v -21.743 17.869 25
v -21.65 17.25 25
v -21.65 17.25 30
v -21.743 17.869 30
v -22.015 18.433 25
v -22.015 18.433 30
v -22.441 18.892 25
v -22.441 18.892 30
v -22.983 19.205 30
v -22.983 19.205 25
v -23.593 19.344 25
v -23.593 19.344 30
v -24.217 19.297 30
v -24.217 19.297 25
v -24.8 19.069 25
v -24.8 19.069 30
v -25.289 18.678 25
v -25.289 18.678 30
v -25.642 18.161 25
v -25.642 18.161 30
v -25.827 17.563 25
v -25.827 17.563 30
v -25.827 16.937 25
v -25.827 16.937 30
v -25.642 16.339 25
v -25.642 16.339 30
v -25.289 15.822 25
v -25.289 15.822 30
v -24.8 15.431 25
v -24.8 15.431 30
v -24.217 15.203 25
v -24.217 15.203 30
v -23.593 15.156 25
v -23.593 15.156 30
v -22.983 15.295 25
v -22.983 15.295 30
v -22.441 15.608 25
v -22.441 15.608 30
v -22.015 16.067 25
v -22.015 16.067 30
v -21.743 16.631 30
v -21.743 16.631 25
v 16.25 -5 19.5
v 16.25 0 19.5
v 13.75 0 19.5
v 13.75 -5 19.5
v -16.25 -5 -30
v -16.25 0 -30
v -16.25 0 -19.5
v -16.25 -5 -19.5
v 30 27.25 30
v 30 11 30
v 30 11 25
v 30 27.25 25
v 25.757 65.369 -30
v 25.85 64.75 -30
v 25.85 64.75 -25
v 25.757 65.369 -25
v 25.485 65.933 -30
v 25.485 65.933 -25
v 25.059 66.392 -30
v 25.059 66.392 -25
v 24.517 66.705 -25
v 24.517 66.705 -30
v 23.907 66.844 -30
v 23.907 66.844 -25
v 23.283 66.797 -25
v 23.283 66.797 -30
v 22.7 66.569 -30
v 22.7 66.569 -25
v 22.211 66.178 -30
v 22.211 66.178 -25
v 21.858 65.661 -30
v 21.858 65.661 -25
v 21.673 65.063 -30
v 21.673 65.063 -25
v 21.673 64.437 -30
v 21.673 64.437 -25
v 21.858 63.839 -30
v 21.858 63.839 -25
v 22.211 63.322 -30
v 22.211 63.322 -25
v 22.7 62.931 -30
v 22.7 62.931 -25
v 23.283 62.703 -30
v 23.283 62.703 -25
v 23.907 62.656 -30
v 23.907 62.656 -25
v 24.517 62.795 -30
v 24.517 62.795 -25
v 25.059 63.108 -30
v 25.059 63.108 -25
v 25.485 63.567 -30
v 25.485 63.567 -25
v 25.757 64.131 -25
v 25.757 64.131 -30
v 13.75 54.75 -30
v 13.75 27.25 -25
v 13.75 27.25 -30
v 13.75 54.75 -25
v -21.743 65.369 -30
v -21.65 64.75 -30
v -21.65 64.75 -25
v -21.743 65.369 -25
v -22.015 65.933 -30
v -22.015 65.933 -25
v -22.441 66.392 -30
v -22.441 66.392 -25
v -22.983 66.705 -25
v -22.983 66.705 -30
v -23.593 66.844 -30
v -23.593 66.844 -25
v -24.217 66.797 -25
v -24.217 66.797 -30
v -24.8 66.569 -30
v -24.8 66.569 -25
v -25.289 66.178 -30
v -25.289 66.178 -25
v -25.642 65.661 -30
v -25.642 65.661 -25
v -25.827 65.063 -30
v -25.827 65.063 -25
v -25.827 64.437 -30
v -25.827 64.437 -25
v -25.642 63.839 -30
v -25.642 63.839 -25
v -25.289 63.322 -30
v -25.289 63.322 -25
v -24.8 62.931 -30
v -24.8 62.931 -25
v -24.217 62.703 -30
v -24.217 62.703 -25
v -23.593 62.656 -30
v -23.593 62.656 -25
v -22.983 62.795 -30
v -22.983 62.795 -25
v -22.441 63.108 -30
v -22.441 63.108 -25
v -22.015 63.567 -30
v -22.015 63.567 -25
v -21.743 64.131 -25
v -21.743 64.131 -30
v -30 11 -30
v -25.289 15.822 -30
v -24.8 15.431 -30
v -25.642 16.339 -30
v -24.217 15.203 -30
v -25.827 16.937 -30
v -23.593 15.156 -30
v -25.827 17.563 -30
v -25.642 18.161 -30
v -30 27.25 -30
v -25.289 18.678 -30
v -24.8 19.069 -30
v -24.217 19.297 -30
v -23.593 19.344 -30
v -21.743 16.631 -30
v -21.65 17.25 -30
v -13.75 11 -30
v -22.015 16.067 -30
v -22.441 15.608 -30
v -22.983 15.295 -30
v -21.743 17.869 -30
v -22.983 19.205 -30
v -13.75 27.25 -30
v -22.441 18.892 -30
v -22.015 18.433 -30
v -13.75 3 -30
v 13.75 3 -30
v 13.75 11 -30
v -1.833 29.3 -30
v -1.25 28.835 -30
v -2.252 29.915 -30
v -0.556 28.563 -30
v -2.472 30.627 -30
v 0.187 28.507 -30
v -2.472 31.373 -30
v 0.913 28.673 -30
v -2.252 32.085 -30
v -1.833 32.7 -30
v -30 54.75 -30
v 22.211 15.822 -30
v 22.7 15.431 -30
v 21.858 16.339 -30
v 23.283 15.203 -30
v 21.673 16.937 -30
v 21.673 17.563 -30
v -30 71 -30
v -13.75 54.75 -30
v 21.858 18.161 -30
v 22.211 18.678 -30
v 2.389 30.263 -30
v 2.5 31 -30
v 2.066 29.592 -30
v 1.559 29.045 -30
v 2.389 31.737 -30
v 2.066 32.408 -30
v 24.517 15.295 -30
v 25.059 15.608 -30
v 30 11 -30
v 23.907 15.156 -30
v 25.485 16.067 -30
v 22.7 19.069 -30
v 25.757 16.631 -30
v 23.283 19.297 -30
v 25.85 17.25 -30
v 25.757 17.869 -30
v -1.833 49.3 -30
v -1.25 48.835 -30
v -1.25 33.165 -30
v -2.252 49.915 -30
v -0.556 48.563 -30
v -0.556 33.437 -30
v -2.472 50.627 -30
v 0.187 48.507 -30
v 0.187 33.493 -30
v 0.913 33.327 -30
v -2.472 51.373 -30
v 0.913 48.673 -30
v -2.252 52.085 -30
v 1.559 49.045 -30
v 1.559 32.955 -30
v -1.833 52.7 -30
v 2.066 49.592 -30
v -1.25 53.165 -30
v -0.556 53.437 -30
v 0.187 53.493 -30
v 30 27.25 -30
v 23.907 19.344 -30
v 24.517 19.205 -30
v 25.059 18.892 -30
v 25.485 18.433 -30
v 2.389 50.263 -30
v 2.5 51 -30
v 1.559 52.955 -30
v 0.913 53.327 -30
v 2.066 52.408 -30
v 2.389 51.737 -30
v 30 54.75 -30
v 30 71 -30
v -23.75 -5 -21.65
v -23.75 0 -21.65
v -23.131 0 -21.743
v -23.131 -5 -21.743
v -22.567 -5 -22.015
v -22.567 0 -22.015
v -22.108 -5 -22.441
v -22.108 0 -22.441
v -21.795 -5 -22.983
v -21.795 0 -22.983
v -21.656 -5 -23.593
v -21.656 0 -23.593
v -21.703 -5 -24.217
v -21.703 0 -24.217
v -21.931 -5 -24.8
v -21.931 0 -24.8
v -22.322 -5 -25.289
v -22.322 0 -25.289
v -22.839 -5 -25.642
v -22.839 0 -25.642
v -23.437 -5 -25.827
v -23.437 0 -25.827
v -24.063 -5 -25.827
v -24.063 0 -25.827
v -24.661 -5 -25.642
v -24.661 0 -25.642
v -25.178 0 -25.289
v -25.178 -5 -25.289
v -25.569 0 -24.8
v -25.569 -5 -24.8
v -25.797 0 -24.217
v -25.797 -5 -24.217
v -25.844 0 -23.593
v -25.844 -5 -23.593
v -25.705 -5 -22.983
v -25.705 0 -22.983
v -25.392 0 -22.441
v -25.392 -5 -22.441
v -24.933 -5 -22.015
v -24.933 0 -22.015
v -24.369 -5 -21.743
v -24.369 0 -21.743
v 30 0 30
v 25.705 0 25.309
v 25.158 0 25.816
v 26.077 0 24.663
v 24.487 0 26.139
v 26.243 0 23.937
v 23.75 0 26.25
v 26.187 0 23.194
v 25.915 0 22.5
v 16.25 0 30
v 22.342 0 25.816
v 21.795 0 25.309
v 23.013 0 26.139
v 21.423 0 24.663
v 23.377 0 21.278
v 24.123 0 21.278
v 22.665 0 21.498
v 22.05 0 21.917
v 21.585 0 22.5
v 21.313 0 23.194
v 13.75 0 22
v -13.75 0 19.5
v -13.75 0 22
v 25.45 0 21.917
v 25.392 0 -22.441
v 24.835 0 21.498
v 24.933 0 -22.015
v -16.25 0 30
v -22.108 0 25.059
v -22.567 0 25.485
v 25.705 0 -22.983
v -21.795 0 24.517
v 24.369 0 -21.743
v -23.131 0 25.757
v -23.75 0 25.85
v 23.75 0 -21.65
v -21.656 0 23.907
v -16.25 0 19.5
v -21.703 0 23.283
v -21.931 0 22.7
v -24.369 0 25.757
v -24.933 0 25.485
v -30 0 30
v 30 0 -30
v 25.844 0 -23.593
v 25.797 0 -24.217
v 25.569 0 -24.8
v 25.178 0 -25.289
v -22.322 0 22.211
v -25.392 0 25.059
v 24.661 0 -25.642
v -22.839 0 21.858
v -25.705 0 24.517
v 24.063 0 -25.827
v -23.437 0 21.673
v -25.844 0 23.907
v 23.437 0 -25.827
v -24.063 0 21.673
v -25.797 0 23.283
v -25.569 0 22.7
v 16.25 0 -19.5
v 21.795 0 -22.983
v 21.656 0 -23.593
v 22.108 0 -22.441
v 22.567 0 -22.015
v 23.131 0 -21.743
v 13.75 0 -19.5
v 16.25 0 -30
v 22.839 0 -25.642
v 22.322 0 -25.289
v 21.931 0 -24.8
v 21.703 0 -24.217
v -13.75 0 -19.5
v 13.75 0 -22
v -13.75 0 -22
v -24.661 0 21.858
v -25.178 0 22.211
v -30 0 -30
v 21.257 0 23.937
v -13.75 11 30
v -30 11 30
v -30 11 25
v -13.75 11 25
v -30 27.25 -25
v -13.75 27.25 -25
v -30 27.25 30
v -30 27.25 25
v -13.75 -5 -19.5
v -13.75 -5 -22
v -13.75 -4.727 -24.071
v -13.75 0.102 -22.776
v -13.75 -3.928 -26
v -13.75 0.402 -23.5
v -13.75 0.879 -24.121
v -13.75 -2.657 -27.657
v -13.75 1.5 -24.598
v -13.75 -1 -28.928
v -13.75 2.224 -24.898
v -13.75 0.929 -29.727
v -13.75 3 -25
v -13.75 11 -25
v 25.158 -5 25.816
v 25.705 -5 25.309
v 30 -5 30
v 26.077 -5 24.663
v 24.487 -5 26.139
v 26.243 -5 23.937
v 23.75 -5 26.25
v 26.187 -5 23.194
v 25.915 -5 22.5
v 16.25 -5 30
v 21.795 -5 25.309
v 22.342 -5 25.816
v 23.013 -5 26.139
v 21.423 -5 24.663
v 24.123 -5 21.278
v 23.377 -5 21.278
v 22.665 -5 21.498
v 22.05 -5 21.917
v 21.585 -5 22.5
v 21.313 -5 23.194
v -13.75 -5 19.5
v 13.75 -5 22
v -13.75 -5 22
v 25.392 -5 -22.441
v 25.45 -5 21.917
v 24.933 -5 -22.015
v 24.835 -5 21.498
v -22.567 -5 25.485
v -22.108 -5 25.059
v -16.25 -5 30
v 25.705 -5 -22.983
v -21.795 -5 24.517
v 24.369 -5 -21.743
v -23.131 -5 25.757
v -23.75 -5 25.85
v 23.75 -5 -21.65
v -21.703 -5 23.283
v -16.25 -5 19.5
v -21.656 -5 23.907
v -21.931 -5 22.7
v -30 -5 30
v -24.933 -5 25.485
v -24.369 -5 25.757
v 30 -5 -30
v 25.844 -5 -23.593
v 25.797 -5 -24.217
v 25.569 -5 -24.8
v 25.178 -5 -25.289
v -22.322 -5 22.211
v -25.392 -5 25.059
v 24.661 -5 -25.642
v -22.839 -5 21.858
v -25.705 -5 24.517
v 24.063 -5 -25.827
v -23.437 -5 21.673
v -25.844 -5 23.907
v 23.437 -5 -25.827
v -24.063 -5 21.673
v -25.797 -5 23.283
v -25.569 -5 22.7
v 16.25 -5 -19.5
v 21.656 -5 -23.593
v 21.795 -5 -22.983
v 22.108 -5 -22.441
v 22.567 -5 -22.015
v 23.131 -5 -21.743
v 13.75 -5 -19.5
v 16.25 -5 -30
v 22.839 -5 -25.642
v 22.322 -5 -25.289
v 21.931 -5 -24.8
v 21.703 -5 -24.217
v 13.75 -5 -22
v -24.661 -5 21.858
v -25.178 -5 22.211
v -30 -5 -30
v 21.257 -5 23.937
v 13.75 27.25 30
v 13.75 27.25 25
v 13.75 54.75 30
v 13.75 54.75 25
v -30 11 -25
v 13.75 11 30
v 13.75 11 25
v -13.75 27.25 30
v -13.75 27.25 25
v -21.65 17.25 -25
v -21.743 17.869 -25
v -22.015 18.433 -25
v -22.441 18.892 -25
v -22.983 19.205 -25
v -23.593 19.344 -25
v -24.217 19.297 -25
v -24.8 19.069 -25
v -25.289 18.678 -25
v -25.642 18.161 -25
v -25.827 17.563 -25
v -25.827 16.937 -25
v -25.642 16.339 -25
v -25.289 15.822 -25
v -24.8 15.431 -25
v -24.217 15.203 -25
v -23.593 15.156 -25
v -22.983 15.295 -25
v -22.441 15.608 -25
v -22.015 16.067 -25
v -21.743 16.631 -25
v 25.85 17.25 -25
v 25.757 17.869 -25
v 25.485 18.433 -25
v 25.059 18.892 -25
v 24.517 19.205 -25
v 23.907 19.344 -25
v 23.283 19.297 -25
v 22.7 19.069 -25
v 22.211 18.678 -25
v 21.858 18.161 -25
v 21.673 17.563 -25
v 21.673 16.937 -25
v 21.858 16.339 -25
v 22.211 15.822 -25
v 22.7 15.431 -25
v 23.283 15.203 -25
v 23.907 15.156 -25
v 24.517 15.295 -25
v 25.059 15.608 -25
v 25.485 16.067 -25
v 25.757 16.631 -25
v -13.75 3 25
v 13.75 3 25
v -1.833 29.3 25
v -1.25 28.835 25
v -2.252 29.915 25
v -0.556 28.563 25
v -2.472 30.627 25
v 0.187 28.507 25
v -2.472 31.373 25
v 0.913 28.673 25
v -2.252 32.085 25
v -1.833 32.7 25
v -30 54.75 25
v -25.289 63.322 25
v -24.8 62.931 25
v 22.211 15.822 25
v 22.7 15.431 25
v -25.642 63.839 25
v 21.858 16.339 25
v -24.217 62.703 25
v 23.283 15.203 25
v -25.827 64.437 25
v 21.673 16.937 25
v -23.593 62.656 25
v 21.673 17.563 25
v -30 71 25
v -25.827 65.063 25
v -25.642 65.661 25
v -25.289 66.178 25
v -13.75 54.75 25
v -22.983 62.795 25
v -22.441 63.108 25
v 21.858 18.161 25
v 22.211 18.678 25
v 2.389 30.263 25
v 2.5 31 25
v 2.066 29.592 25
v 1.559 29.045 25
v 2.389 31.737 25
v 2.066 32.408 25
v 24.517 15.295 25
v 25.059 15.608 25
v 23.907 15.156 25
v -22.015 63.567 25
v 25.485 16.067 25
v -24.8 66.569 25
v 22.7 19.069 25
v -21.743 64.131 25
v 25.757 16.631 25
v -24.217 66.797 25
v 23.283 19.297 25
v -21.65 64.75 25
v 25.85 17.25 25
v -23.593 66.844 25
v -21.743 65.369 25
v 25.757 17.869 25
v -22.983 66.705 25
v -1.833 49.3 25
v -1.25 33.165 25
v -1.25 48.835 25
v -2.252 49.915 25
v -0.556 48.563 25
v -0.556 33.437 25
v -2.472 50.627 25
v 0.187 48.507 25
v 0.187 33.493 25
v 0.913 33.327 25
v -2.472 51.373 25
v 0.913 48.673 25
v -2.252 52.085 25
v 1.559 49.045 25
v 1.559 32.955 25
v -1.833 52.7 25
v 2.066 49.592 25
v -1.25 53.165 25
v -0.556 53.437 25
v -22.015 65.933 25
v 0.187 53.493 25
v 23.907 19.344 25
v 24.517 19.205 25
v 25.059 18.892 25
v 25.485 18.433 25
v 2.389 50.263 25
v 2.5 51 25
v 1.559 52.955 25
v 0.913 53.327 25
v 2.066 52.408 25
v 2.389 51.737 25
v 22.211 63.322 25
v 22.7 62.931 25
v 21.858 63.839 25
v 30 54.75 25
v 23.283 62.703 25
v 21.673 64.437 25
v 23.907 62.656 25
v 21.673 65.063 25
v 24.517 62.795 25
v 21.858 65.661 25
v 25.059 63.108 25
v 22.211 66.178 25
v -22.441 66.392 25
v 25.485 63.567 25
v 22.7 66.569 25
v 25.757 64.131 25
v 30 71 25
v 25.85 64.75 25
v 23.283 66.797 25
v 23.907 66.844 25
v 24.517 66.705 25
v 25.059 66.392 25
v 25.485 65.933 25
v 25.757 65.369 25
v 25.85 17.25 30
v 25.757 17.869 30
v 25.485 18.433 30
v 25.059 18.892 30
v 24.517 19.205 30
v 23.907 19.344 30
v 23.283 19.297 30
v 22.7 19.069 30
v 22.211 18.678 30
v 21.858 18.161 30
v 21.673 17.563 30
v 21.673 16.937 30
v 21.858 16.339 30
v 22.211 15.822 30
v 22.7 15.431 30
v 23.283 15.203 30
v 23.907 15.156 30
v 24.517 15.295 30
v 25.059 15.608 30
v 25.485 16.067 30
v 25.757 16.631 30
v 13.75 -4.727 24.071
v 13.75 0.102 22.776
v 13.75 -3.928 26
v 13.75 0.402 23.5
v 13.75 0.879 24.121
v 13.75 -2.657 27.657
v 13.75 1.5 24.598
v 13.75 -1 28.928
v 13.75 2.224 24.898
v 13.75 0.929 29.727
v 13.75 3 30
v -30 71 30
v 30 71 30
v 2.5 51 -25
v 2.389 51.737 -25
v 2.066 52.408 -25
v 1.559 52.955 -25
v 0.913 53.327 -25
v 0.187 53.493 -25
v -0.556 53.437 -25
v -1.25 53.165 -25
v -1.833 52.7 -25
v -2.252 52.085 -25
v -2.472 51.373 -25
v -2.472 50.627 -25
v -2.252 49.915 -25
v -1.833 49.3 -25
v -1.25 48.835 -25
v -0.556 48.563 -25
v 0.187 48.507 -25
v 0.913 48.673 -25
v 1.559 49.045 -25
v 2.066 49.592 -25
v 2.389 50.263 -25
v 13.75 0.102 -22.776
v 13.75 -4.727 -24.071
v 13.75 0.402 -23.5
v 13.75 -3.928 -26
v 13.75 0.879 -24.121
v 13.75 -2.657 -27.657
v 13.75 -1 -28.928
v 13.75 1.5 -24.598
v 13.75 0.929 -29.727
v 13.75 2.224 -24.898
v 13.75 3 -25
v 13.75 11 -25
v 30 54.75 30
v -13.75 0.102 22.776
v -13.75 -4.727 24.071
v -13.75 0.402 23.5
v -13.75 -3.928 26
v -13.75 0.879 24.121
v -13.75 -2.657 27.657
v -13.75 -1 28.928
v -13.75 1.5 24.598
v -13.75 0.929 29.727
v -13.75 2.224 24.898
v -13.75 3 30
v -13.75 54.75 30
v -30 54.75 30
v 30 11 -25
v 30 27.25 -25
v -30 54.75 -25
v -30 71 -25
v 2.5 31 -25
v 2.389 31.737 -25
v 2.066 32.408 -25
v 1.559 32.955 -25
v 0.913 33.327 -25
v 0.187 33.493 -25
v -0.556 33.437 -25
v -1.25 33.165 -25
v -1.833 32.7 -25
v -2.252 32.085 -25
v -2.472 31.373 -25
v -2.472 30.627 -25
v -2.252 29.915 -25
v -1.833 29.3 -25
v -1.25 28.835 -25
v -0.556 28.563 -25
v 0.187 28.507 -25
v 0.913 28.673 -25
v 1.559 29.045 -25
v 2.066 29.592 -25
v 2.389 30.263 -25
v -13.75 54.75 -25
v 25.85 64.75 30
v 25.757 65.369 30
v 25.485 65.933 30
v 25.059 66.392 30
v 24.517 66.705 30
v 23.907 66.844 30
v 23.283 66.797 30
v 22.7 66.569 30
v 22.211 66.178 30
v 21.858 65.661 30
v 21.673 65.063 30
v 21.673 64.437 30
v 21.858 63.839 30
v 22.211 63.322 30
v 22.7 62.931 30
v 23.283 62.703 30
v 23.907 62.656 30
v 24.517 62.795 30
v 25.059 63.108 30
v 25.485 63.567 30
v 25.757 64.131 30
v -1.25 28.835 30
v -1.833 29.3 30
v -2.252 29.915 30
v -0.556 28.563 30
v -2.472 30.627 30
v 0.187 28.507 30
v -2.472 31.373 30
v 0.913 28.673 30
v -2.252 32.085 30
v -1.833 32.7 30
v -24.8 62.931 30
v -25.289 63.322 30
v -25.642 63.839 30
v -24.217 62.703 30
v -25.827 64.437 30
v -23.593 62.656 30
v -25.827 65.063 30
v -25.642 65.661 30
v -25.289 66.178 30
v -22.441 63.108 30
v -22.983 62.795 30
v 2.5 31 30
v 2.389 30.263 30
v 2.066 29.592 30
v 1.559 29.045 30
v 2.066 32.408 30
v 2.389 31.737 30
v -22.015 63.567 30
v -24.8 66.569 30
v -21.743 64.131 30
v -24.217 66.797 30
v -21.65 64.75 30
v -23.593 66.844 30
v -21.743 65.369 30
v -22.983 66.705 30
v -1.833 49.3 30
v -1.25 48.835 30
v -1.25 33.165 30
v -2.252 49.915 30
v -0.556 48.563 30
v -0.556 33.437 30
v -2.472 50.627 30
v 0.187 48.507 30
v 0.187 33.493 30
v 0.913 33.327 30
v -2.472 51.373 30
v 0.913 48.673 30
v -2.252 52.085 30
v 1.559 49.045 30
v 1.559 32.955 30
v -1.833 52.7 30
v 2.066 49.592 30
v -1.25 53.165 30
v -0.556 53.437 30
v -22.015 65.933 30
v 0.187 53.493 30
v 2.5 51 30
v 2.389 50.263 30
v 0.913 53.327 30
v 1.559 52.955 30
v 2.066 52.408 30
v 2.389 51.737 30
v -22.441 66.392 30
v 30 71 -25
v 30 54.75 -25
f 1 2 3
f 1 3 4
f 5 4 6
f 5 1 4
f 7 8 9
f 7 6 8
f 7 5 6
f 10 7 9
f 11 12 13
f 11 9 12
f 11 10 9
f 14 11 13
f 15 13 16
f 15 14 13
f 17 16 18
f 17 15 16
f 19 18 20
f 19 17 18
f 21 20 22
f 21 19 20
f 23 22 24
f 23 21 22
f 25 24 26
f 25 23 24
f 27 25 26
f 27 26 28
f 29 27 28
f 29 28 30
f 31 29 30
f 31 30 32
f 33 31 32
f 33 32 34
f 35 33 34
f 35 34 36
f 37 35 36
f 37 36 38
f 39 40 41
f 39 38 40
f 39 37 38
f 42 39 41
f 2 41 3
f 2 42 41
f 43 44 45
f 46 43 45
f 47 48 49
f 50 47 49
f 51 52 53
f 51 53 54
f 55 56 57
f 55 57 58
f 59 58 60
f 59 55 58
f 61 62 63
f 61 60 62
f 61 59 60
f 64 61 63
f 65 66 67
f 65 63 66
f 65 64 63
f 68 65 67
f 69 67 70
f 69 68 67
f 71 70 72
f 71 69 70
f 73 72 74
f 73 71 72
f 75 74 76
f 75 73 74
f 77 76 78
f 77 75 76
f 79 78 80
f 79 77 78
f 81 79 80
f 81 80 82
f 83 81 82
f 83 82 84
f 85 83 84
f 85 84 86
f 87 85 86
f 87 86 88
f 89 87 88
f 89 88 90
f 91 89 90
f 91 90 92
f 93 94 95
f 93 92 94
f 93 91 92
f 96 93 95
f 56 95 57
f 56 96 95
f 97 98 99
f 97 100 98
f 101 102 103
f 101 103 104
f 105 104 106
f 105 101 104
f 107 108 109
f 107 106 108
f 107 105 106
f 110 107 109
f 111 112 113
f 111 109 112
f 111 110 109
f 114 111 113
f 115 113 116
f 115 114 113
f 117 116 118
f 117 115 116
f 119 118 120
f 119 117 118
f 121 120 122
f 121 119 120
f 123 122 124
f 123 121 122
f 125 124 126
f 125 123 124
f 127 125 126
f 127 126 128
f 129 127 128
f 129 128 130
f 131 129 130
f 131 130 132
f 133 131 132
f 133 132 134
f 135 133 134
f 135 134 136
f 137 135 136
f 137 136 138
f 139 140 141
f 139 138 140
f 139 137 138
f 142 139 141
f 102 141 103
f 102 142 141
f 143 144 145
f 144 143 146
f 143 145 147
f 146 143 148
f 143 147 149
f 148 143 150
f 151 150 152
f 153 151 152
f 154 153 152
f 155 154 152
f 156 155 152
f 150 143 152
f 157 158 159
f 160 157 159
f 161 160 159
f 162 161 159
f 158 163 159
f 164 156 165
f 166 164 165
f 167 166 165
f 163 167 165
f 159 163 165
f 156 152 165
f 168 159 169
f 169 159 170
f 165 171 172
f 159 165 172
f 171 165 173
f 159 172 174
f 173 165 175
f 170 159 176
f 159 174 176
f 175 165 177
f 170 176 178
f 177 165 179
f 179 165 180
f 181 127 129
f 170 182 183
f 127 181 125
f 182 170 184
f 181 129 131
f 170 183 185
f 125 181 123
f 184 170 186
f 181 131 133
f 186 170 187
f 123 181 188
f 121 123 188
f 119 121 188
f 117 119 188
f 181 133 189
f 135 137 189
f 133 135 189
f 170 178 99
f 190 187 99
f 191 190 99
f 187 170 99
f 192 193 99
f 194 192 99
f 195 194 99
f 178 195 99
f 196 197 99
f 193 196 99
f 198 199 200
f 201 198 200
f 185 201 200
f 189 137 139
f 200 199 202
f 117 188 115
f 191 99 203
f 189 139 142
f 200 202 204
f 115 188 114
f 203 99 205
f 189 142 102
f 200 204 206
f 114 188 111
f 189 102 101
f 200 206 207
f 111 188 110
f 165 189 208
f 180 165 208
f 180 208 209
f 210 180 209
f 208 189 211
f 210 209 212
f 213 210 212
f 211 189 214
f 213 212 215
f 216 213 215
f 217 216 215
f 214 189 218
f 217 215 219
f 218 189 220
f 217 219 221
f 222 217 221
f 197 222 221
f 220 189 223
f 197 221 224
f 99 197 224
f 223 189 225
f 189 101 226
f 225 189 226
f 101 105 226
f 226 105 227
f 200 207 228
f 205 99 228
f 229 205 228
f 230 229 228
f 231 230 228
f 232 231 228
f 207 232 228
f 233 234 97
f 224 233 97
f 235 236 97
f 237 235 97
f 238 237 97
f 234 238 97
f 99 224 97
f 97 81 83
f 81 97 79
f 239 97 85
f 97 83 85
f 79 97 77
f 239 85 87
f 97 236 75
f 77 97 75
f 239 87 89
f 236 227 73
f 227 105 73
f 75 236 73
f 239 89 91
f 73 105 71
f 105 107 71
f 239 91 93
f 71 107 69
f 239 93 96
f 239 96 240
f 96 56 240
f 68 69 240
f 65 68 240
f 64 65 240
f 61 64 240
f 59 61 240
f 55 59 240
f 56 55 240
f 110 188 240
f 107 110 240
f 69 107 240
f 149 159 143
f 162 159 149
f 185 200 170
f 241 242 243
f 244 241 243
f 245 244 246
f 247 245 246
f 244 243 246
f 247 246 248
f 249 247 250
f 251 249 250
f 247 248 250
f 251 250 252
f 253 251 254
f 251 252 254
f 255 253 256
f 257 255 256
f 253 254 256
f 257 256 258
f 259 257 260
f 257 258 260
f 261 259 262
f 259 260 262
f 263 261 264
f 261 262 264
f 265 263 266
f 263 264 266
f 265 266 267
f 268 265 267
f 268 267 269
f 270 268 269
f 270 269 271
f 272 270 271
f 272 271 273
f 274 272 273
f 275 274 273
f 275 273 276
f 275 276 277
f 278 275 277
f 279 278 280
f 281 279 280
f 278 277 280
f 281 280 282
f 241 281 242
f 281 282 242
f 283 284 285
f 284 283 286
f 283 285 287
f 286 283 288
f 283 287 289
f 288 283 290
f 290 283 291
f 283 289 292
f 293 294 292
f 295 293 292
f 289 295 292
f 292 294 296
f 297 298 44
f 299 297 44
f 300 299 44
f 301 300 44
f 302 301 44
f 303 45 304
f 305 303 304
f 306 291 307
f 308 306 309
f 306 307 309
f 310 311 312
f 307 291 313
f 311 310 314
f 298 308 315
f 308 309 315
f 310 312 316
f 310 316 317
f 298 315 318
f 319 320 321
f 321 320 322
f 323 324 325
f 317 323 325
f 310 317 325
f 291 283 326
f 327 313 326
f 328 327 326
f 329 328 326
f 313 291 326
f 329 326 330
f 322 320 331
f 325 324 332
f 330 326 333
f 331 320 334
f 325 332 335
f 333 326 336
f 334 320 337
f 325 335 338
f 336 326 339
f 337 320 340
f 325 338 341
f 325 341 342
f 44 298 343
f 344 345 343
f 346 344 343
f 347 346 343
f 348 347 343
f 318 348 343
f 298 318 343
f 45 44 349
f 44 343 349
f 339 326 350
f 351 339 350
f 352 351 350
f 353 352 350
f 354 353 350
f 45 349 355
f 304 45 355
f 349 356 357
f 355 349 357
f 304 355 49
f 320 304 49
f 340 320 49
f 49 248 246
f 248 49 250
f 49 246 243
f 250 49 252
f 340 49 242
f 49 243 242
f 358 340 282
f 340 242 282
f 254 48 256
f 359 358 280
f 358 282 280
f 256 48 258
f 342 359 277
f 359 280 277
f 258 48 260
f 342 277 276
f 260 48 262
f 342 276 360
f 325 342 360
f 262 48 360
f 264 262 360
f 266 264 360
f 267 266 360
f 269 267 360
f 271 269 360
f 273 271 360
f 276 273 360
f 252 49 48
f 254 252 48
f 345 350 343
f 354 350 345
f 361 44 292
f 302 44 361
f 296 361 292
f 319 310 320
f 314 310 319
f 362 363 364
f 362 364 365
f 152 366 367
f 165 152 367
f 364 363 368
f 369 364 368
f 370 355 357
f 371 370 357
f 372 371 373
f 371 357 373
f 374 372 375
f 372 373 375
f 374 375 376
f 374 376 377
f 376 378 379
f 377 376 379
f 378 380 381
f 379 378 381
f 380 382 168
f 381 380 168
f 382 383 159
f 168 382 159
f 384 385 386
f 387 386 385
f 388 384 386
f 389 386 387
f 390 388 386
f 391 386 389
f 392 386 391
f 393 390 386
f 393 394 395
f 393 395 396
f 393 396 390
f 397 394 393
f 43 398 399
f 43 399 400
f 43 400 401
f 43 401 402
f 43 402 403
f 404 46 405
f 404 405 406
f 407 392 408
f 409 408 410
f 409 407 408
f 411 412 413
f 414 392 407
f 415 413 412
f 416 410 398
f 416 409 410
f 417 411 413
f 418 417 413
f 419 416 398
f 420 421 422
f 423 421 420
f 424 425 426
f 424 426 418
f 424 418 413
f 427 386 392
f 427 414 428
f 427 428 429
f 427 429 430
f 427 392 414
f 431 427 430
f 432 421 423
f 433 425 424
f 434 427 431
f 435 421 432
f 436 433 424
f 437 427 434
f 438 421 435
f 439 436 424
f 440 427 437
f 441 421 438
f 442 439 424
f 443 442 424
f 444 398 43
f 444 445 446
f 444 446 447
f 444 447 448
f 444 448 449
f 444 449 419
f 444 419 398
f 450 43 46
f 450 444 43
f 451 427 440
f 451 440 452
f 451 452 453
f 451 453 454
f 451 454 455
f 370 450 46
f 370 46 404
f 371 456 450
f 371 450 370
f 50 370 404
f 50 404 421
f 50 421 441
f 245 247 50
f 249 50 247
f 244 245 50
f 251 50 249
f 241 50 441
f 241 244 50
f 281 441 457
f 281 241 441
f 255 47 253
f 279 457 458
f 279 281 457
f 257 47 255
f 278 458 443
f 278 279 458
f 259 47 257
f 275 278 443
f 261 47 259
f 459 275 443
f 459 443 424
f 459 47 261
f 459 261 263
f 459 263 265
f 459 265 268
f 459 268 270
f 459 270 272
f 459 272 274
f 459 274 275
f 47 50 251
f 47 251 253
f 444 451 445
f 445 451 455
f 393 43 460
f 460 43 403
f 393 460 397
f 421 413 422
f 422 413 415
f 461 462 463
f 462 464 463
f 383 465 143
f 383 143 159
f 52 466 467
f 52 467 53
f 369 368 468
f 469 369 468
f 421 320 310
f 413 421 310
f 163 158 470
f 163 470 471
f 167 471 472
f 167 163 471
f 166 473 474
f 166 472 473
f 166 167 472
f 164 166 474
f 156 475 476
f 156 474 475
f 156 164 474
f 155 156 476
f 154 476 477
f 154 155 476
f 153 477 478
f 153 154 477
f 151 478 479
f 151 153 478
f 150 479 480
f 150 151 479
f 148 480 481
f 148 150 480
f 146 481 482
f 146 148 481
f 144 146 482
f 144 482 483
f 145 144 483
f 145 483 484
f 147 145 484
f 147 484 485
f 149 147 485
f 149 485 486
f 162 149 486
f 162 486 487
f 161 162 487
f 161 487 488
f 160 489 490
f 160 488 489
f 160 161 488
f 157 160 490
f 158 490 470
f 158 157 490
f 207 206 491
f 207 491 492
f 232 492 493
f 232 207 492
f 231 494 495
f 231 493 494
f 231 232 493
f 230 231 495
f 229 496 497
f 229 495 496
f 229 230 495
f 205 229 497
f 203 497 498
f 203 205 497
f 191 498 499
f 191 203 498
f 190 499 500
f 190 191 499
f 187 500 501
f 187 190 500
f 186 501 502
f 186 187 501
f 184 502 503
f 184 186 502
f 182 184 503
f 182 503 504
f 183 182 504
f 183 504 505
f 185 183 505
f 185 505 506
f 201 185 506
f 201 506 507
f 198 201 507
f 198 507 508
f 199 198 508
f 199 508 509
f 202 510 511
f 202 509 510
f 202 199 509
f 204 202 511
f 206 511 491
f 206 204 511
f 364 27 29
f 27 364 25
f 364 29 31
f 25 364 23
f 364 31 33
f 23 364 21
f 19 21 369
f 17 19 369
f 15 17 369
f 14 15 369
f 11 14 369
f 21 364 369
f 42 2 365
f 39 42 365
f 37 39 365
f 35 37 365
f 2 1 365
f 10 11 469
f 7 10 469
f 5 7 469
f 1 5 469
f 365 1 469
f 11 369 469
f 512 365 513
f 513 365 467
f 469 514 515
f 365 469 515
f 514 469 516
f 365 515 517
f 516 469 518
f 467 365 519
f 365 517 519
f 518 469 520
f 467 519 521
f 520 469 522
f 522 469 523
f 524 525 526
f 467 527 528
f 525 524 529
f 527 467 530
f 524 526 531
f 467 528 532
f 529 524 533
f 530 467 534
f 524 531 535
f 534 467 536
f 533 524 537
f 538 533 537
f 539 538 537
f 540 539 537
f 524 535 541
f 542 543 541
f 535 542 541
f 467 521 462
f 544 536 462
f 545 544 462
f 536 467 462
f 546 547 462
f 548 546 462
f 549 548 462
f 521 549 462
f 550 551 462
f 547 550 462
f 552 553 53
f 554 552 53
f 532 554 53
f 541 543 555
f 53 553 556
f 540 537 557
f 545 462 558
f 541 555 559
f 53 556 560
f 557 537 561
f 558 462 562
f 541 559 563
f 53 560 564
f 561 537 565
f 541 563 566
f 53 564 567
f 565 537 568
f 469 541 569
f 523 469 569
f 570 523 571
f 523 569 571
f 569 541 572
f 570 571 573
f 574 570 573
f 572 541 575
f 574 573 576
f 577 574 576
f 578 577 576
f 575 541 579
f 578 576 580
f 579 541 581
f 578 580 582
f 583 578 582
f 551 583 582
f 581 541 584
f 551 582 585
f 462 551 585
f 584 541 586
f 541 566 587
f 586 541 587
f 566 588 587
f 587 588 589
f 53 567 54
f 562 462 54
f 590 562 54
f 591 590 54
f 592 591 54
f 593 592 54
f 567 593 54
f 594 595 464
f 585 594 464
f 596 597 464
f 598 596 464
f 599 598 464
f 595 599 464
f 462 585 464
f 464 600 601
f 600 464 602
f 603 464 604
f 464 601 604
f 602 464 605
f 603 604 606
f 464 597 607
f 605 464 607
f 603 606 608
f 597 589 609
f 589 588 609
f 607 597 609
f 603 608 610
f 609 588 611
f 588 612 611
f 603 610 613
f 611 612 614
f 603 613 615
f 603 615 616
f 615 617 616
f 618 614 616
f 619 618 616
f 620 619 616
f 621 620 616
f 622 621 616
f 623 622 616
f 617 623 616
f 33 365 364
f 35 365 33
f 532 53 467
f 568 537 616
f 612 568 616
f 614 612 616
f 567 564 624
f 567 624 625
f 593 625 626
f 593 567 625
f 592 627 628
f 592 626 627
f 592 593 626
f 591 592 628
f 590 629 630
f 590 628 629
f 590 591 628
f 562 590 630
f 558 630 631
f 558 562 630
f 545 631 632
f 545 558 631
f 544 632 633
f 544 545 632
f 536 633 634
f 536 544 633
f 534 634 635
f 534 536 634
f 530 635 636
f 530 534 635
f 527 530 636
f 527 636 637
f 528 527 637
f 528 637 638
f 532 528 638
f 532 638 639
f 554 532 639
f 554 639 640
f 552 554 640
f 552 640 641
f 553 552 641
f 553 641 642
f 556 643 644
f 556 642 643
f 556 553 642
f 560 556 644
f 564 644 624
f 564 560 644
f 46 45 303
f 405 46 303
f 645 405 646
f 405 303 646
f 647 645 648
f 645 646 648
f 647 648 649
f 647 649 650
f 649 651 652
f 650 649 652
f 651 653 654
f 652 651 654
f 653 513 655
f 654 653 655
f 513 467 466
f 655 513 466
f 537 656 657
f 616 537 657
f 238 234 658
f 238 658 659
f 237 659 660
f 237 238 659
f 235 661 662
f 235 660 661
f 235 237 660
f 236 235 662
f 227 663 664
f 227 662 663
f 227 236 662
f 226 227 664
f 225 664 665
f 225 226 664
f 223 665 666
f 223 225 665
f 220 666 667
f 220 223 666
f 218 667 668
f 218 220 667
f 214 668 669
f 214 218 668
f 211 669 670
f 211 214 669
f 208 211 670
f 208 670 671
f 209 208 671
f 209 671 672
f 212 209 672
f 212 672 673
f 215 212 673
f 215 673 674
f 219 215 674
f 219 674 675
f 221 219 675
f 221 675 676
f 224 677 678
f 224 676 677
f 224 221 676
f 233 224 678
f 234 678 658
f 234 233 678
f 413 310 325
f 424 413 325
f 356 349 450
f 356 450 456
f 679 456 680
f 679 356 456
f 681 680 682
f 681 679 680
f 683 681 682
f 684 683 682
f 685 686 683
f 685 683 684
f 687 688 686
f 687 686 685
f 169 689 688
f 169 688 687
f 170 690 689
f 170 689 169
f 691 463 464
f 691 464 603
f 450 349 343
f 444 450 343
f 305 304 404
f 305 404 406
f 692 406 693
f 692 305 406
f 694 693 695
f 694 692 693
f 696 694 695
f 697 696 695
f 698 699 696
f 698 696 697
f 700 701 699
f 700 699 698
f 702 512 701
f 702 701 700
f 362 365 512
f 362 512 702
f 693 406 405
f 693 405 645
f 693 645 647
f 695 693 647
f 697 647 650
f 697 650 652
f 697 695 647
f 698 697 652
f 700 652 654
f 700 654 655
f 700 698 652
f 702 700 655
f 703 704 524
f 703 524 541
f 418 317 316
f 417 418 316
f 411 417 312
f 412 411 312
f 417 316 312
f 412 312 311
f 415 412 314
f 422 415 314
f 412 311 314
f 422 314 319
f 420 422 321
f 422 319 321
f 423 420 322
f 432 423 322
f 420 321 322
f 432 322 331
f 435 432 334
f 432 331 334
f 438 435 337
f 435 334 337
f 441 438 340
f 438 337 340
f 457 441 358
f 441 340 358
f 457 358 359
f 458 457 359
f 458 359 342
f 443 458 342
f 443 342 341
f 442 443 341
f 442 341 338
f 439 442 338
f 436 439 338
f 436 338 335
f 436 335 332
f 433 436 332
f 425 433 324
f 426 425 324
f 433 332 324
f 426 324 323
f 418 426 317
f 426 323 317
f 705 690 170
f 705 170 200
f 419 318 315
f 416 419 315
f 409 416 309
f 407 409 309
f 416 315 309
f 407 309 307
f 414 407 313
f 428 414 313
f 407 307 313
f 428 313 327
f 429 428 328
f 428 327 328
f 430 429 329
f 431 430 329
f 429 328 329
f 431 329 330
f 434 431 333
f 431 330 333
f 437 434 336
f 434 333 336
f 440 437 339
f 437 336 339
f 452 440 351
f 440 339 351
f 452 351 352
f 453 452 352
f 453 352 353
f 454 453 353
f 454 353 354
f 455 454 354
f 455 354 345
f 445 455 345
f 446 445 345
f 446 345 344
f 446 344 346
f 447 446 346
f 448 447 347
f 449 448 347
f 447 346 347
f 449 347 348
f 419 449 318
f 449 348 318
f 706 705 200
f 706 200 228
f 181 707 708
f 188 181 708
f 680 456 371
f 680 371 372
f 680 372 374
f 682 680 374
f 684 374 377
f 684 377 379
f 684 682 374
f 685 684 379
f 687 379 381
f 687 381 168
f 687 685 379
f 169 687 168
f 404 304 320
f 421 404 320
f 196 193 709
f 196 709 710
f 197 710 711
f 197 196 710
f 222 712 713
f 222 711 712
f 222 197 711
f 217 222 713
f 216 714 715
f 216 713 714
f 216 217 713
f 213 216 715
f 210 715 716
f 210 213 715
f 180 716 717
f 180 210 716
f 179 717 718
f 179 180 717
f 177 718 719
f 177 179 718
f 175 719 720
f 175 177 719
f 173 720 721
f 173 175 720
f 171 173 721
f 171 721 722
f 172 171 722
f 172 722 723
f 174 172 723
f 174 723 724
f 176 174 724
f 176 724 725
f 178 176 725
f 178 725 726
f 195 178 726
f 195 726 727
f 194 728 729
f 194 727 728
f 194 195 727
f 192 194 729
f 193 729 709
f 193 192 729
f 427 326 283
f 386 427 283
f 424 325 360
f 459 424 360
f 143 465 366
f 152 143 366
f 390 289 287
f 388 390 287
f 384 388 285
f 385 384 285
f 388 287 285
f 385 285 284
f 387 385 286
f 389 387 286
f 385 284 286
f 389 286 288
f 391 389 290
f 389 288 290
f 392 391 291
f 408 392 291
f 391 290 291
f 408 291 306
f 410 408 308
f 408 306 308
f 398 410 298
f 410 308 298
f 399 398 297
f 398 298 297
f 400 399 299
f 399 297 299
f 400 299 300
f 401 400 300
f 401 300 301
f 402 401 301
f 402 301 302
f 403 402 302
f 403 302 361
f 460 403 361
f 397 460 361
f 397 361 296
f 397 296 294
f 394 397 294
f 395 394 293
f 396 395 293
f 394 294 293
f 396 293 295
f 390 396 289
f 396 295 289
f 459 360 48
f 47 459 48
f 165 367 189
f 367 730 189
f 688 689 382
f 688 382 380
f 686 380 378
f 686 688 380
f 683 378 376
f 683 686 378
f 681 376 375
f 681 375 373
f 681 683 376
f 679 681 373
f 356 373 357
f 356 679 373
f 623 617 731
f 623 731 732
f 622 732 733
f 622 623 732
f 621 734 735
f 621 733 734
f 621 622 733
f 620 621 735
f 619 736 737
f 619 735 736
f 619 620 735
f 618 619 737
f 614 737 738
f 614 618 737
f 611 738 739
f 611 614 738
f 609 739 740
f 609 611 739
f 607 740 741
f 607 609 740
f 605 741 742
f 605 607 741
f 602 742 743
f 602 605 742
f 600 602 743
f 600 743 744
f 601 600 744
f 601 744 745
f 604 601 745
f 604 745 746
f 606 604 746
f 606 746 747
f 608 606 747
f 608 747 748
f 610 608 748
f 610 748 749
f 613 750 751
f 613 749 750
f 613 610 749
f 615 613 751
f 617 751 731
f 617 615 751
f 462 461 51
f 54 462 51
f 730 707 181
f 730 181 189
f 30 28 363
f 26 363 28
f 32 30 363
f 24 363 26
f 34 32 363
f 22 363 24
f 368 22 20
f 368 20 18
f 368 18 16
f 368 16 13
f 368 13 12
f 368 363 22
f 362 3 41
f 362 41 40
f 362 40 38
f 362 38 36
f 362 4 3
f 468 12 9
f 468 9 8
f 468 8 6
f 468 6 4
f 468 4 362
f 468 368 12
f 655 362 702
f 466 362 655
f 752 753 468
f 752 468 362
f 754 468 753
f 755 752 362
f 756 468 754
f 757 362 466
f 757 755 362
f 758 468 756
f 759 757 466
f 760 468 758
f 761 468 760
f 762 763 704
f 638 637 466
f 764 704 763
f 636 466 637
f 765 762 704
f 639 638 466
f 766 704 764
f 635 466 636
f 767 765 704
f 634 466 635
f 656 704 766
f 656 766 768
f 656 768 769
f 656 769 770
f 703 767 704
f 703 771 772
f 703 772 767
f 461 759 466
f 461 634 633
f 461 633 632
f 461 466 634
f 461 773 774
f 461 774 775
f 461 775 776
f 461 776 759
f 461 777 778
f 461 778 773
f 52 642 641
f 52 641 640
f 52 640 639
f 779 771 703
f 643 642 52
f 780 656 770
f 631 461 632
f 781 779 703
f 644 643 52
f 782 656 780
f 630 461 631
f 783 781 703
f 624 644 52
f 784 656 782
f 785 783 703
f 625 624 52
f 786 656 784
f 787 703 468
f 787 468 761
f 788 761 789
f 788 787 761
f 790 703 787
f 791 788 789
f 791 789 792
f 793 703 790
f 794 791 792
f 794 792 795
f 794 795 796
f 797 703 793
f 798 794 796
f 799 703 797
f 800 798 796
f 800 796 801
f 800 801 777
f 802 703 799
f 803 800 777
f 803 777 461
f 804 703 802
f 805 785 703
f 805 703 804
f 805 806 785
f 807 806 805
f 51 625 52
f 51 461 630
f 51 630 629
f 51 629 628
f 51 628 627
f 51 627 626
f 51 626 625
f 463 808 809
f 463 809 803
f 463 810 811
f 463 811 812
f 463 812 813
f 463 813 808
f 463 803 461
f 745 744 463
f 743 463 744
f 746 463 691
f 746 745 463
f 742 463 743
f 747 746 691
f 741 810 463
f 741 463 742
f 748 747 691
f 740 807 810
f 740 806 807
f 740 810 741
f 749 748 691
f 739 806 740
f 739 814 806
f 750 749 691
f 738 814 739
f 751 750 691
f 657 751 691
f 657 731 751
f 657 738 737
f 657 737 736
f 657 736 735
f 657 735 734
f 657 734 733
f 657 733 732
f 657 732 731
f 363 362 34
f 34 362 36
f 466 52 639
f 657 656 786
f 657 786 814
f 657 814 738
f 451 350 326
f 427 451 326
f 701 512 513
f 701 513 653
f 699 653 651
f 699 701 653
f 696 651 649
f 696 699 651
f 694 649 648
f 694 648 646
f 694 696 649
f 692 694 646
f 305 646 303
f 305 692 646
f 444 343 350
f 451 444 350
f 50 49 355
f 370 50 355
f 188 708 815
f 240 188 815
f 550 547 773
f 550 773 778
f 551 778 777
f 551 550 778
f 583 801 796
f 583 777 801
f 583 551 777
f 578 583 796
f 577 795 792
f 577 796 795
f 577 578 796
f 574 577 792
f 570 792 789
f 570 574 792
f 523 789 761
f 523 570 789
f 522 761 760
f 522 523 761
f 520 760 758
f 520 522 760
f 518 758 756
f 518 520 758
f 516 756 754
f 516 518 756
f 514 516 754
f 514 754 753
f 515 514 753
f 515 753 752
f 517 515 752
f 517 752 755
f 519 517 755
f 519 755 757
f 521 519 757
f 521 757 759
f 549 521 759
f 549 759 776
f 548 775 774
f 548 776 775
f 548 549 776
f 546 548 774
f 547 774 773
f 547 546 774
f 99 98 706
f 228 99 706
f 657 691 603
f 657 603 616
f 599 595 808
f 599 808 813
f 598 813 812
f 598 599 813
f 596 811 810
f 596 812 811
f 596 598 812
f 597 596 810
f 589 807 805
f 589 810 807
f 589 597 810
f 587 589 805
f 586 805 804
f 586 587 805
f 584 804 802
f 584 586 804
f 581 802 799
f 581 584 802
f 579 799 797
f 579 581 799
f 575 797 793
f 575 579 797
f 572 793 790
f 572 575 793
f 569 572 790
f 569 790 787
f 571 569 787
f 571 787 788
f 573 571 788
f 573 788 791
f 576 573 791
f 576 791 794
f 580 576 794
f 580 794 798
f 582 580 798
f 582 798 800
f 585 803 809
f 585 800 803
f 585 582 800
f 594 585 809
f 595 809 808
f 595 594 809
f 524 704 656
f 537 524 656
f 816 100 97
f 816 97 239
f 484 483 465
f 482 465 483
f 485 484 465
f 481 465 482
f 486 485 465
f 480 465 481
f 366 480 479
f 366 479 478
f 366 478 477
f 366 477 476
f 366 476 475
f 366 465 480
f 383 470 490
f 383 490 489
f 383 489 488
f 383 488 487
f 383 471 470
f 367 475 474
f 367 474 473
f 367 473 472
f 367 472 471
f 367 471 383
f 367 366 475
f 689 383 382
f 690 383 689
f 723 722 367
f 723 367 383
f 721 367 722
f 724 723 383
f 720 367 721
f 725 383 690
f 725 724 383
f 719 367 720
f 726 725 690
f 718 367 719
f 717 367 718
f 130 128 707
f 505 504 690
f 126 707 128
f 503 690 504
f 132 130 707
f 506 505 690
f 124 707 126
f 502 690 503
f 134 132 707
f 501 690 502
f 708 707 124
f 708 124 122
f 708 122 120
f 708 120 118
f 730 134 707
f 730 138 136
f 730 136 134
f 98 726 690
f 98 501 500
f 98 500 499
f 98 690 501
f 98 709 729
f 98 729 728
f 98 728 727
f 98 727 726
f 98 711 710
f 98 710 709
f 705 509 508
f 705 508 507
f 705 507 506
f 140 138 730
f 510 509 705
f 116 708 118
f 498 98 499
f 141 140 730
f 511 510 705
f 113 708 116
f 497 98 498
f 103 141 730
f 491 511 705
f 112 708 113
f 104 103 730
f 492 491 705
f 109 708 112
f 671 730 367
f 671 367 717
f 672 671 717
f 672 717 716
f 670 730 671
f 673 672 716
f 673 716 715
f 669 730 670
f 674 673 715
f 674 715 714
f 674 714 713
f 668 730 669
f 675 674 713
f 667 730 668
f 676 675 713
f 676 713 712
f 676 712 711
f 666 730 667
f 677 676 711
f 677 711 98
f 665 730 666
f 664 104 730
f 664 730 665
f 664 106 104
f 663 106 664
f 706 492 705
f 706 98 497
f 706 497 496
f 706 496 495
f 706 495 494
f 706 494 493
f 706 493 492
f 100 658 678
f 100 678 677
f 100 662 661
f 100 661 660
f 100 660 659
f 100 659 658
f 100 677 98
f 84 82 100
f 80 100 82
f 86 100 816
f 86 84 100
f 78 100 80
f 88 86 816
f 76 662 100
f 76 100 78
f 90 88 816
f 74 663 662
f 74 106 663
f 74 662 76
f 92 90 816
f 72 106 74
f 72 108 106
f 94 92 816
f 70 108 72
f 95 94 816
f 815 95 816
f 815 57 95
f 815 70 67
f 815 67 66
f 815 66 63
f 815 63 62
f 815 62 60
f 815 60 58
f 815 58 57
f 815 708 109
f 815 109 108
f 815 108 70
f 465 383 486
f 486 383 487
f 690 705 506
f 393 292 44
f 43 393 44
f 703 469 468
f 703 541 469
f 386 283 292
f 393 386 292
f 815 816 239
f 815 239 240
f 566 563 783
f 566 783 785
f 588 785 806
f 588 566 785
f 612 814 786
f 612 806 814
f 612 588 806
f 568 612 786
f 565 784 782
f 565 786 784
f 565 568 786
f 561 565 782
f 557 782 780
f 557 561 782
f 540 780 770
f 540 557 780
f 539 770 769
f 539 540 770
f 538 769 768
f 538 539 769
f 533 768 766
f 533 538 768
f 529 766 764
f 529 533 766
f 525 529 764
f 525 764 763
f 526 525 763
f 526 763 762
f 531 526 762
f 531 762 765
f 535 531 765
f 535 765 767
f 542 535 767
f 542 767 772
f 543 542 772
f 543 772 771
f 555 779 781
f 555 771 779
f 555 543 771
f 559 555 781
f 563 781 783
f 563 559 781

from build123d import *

# Parameters (mm, degrees)
SKETCH_16_R                       = 2.1
SKETCH_16_R_2                     = 2.5
SM_BASE_FLANGE_2_DEPTH            = 5
SM_EDGE_FLANGE_1_STRIP_W          = 26
SM_EDGE_FLANGE_1_STRIP_H          = 5
SM_EDGE_FLANGE_1_STRIP_CUT_DEPTH  = 27.5
SM_EDGE_FLANGE_1_RELIEF_W         = 28.5
SM_EDGE_FLANGE_1_RELIEF_H         = 2.5
SM_EDGE_FLANGE_1_RELIEF_CUT_DEPTH = 5
SM_EDGE_FLANGE_1_DEPTH            = 27.5
SM_EDGE_FLANGE_2_STRIP_W          = 26
SM_EDGE_FLANGE_2_STRIP_H          = 5
SM_EDGE_FLANGE_2_STRIP_CUT_DEPTH  = 27.5
SM_EDGE_FLANGE_2_RELIEF_W         = 28.5
SM_EDGE_FLANGE_2_RELIEF_H         = 2.5
SM_EDGE_FLANGE_2_RELIEF_CUT_DEPTH = 5
SM_EDGE_FLANGE_2_DEPTH            = 27.5
EXTRUDE_START                     = 30
SKETCH_23_W                       = 16.25
SKETCH_23_H                       = 16.25
EXTRUDE_1_DEPTH                   = 5
EXTRUDE_START_2                   = -25
SKETCH_24_W                       = 16.25
SKETCH_24_H                       = 16.25
EXTRUDE_2_DEPTH                   = 5
CUT_EXTRUDE_1_DEPTH               = 83.710337927
CUT_EXTRUDE_1_DEPTH_BACK          = 83.710337927
SKETCH_25_R                       = 2.1
CUT_EXTRUDE_2_DEPTH               = 83.710337927
CUT_EXTRUDE_2_DEPTH_BACK          = 83.710337927
SKETCH_26_R                       = 2.5


# Sheet-metal steps are written as plain solids
with BuildPart() as part:
    # 草图16 → 基体-法兰2 (new body)
    with BuildSketch(Plane(origin=(0, 0, 0), x_dir=(1, 0, 0), z_dir=(0, 1, 0))):
        Polygon((16.25, 30), (30, 30), (30, -30), (16.25, -30), (16.25, -25), (-16.25, -25), (-16.25, -30), (-30, -30), (-30, 30), (-16.25, 30), (-16.25, 25), (16.25, 25), align=None)
        with Locations(Location((-23.75, 23.75, 0), (0, 0, 270))):
            Circle(SKETCH_16_R, mode=Mode.SUBTRACT)
        with Locations(Location((-23.75, -23.75, 0), (0, 0, 270))):
            Circle(SKETCH_16_R, mode=Mode.SUBTRACT)
        with Locations(Location((23.75, 23.75, 0), (0, 0, 270))):
            Circle(SKETCH_16_R, mode=Mode.SUBTRACT)
        with Locations(Location((23.75, -23.75, 0), (0, 0, 270))):
            Circle(SKETCH_16_R_2, mode=Mode.SUBTRACT)
    extrude(amount=-SM_BASE_FLANGE_2_DEPTH)

    # 边线-法兰1 strip (across the edge) → 边线-法兰1 strip cut (cut)
    with BuildSketch(Plane(origin=(-13.75, 0, 25), x_dir=(0, 0, -1), z_dir=(1, 0, 0))):
        with Locations((-10, -2.5)):
            Rectangle(SM_EDGE_FLANGE_1_STRIP_W, SM_EDGE_FLANGE_1_STRIP_H)
    extrude(amount=SM_EDGE_FLANGE_1_STRIP_CUT_DEPTH, mode=Mode.SUBTRACT)

    # 边线-法兰1 relief (on the sheet) → 边线-法兰1 relief cut (cut)
    with BuildSketch(Plane(origin=(-13.75, 0, 22), x_dir=(0, 0, -1), z_dir=(0, 1, 0))):
        with Locations((-11.75, 1.25)):
            Rectangle(SM_EDGE_FLANGE_1_RELIEF_W, SM_EDGE_FLANGE_1_RELIEF_H)
        with Locations((-11.75, -28.75)):
            Rectangle(SM_EDGE_FLANGE_1_RELIEF_W, SM_EDGE_FLANGE_1_RELIEF_H)
    extrude(amount=-SM_EDGE_FLANGE_1_RELIEF_CUT_DEPTH, mode=Mode.SUBTRACT)

    # 边线-法兰1 section (across the edge) → 边线-法兰1 (add)
    with BuildSketch(Plane(origin=(-13.75, 0, 25), x_dir=(0, 0, -1), z_dir=(1, 0, 0))):
        with BuildLine():
            Line((-5, 3), (-5, 71))
            Line((-5, 71), (0, 71))
            Line((0, 71), (0, 3))
            ThreePointArc((0, 3), (0.878679656, 0.878679656), (3, 0))
            Line((3, 0), (3, -5))
            ThreePointArc((3, -5), (-2.656854249, -2.656854249), (-5, 3))
        make_face()
    extrude(amount=SM_EDGE_FLANGE_1_DEPTH)

    # 边线-法兰2 strip (across the edge) → 边线-法兰2 strip cut (cut)
    with BuildSketch(Plane(origin=(13.75, 0, -25), x_dir=(0, 0, 1), z_dir=(-1, 0, 0))):
        with Locations((-10, -2.5)):
            Rectangle(SM_EDGE_FLANGE_2_STRIP_W, SM_EDGE_FLANGE_2_STRIP_H)
    extrude(amount=SM_EDGE_FLANGE_2_STRIP_CUT_DEPTH, mode=Mode.SUBTRACT)

    # 边线-法兰2 relief (on the sheet) → 边线-法兰2 relief cut (cut)
    with BuildSketch(Plane(origin=(13.75, 0, -22), x_dir=(0, 0, 1), z_dir=(0, 1, 0))):
        with Locations((-11.75, 1.25)):
            Rectangle(SM_EDGE_FLANGE_2_RELIEF_W, SM_EDGE_FLANGE_2_RELIEF_H)
        with Locations((-11.75, -28.75)):
            Rectangle(SM_EDGE_FLANGE_2_RELIEF_W, SM_EDGE_FLANGE_2_RELIEF_H)
    extrude(amount=-SM_EDGE_FLANGE_2_RELIEF_CUT_DEPTH, mode=Mode.SUBTRACT)

    # 边线-法兰2 section (across the edge) → 边线-法兰2 (add)
    with BuildSketch(Plane(origin=(13.75, 0, -25), x_dir=(0, 0, 1), z_dir=(-1, 0, 0))):
        with BuildLine():
            Line((-5, 3), (-5, 71))
            Line((-5, 71), (0, 71))
            Line((0, 71), (0, 3))
            ThreePointArc((0, 3), (0.878679656, 0.878679656), (3, 0))
            Line((3, 0), (3, -5))
            ThreePointArc((3, -5), (-2.656854249, -2.656854249), (-5, 3))
        make_face()
    extrude(amount=SM_EDGE_FLANGE_2_DEPTH)

    # 草图23 → 凸台-拉伸1 (add)
    with BuildSketch(Plane.XY.offset(EXTRUDE_START)):
        with Locations((-21.875, 62.875)):
            Rectangle(SKETCH_23_W, SKETCH_23_H)
        with Locations((21.875, 62.875)):
            Rectangle(SKETCH_23_W, SKETCH_23_H)
        with Locations((21.875, 19.125)):
            Rectangle(SKETCH_23_W, SKETCH_23_H)
        with Locations((-21.875, 19.125)):
            Rectangle(SKETCH_23_W, SKETCH_23_H)
    extrude(amount=-EXTRUDE_1_DEPTH)

    # 草图24 → 凸台-拉伸2 (add)
    with BuildSketch(Plane.XY.offset(EXTRUDE_START_2)):
        with Locations((21.875, 62.875)):
            Rectangle(SKETCH_24_W, SKETCH_24_H)
        with Locations((-21.875, 62.875)):
            Rectangle(SKETCH_24_W, SKETCH_24_H)
        with Locations((-21.875, 19.125)):
            Rectangle(SKETCH_24_W, SKETCH_24_H)
        with Locations((21.875, 19.125)):
            Rectangle(SKETCH_24_W, SKETCH_24_H)
    extrude(amount=-EXTRUDE_2_DEPTH)

    # 草图25 → 切除-拉伸1 (cut, two sides: drawn at the far end of the back side and taken through both)
    with BuildSketch(Plane.XY.offset(-CUT_EXTRUDE_1_DEPTH_BACK)):
        with Locations((-23.75, 64.75)):
            Circle(SKETCH_25_R)
        with Locations((23.75, 64.75)):
            Circle(SKETCH_25_R)
        with Locations((-23.75, 17.25)):
            Circle(SKETCH_25_R)
        with Locations((23.75, 17.25)):
            Circle(SKETCH_25_R)
    extrude(amount=CUT_EXTRUDE_1_DEPTH + CUT_EXTRUDE_1_DEPTH_BACK, mode=Mode.SUBTRACT)

    # 草图26 → 切除-拉伸2 (cut, two sides: drawn at the far end of the back side and taken through both)
    with BuildSketch(Plane.XY.offset(-CUT_EXTRUDE_2_DEPTH_BACK)):
        with Locations((0, 51)):
            Circle(SKETCH_26_R)
        with Locations((0, 31)):
            Circle(SKETCH_26_R)
    extrude(amount=CUT_EXTRUDE_2_DEPTH + CUT_EXTRUDE_2_DEPTH_BACK, mode=Mode.SUBTRACT)


solid = part.part
